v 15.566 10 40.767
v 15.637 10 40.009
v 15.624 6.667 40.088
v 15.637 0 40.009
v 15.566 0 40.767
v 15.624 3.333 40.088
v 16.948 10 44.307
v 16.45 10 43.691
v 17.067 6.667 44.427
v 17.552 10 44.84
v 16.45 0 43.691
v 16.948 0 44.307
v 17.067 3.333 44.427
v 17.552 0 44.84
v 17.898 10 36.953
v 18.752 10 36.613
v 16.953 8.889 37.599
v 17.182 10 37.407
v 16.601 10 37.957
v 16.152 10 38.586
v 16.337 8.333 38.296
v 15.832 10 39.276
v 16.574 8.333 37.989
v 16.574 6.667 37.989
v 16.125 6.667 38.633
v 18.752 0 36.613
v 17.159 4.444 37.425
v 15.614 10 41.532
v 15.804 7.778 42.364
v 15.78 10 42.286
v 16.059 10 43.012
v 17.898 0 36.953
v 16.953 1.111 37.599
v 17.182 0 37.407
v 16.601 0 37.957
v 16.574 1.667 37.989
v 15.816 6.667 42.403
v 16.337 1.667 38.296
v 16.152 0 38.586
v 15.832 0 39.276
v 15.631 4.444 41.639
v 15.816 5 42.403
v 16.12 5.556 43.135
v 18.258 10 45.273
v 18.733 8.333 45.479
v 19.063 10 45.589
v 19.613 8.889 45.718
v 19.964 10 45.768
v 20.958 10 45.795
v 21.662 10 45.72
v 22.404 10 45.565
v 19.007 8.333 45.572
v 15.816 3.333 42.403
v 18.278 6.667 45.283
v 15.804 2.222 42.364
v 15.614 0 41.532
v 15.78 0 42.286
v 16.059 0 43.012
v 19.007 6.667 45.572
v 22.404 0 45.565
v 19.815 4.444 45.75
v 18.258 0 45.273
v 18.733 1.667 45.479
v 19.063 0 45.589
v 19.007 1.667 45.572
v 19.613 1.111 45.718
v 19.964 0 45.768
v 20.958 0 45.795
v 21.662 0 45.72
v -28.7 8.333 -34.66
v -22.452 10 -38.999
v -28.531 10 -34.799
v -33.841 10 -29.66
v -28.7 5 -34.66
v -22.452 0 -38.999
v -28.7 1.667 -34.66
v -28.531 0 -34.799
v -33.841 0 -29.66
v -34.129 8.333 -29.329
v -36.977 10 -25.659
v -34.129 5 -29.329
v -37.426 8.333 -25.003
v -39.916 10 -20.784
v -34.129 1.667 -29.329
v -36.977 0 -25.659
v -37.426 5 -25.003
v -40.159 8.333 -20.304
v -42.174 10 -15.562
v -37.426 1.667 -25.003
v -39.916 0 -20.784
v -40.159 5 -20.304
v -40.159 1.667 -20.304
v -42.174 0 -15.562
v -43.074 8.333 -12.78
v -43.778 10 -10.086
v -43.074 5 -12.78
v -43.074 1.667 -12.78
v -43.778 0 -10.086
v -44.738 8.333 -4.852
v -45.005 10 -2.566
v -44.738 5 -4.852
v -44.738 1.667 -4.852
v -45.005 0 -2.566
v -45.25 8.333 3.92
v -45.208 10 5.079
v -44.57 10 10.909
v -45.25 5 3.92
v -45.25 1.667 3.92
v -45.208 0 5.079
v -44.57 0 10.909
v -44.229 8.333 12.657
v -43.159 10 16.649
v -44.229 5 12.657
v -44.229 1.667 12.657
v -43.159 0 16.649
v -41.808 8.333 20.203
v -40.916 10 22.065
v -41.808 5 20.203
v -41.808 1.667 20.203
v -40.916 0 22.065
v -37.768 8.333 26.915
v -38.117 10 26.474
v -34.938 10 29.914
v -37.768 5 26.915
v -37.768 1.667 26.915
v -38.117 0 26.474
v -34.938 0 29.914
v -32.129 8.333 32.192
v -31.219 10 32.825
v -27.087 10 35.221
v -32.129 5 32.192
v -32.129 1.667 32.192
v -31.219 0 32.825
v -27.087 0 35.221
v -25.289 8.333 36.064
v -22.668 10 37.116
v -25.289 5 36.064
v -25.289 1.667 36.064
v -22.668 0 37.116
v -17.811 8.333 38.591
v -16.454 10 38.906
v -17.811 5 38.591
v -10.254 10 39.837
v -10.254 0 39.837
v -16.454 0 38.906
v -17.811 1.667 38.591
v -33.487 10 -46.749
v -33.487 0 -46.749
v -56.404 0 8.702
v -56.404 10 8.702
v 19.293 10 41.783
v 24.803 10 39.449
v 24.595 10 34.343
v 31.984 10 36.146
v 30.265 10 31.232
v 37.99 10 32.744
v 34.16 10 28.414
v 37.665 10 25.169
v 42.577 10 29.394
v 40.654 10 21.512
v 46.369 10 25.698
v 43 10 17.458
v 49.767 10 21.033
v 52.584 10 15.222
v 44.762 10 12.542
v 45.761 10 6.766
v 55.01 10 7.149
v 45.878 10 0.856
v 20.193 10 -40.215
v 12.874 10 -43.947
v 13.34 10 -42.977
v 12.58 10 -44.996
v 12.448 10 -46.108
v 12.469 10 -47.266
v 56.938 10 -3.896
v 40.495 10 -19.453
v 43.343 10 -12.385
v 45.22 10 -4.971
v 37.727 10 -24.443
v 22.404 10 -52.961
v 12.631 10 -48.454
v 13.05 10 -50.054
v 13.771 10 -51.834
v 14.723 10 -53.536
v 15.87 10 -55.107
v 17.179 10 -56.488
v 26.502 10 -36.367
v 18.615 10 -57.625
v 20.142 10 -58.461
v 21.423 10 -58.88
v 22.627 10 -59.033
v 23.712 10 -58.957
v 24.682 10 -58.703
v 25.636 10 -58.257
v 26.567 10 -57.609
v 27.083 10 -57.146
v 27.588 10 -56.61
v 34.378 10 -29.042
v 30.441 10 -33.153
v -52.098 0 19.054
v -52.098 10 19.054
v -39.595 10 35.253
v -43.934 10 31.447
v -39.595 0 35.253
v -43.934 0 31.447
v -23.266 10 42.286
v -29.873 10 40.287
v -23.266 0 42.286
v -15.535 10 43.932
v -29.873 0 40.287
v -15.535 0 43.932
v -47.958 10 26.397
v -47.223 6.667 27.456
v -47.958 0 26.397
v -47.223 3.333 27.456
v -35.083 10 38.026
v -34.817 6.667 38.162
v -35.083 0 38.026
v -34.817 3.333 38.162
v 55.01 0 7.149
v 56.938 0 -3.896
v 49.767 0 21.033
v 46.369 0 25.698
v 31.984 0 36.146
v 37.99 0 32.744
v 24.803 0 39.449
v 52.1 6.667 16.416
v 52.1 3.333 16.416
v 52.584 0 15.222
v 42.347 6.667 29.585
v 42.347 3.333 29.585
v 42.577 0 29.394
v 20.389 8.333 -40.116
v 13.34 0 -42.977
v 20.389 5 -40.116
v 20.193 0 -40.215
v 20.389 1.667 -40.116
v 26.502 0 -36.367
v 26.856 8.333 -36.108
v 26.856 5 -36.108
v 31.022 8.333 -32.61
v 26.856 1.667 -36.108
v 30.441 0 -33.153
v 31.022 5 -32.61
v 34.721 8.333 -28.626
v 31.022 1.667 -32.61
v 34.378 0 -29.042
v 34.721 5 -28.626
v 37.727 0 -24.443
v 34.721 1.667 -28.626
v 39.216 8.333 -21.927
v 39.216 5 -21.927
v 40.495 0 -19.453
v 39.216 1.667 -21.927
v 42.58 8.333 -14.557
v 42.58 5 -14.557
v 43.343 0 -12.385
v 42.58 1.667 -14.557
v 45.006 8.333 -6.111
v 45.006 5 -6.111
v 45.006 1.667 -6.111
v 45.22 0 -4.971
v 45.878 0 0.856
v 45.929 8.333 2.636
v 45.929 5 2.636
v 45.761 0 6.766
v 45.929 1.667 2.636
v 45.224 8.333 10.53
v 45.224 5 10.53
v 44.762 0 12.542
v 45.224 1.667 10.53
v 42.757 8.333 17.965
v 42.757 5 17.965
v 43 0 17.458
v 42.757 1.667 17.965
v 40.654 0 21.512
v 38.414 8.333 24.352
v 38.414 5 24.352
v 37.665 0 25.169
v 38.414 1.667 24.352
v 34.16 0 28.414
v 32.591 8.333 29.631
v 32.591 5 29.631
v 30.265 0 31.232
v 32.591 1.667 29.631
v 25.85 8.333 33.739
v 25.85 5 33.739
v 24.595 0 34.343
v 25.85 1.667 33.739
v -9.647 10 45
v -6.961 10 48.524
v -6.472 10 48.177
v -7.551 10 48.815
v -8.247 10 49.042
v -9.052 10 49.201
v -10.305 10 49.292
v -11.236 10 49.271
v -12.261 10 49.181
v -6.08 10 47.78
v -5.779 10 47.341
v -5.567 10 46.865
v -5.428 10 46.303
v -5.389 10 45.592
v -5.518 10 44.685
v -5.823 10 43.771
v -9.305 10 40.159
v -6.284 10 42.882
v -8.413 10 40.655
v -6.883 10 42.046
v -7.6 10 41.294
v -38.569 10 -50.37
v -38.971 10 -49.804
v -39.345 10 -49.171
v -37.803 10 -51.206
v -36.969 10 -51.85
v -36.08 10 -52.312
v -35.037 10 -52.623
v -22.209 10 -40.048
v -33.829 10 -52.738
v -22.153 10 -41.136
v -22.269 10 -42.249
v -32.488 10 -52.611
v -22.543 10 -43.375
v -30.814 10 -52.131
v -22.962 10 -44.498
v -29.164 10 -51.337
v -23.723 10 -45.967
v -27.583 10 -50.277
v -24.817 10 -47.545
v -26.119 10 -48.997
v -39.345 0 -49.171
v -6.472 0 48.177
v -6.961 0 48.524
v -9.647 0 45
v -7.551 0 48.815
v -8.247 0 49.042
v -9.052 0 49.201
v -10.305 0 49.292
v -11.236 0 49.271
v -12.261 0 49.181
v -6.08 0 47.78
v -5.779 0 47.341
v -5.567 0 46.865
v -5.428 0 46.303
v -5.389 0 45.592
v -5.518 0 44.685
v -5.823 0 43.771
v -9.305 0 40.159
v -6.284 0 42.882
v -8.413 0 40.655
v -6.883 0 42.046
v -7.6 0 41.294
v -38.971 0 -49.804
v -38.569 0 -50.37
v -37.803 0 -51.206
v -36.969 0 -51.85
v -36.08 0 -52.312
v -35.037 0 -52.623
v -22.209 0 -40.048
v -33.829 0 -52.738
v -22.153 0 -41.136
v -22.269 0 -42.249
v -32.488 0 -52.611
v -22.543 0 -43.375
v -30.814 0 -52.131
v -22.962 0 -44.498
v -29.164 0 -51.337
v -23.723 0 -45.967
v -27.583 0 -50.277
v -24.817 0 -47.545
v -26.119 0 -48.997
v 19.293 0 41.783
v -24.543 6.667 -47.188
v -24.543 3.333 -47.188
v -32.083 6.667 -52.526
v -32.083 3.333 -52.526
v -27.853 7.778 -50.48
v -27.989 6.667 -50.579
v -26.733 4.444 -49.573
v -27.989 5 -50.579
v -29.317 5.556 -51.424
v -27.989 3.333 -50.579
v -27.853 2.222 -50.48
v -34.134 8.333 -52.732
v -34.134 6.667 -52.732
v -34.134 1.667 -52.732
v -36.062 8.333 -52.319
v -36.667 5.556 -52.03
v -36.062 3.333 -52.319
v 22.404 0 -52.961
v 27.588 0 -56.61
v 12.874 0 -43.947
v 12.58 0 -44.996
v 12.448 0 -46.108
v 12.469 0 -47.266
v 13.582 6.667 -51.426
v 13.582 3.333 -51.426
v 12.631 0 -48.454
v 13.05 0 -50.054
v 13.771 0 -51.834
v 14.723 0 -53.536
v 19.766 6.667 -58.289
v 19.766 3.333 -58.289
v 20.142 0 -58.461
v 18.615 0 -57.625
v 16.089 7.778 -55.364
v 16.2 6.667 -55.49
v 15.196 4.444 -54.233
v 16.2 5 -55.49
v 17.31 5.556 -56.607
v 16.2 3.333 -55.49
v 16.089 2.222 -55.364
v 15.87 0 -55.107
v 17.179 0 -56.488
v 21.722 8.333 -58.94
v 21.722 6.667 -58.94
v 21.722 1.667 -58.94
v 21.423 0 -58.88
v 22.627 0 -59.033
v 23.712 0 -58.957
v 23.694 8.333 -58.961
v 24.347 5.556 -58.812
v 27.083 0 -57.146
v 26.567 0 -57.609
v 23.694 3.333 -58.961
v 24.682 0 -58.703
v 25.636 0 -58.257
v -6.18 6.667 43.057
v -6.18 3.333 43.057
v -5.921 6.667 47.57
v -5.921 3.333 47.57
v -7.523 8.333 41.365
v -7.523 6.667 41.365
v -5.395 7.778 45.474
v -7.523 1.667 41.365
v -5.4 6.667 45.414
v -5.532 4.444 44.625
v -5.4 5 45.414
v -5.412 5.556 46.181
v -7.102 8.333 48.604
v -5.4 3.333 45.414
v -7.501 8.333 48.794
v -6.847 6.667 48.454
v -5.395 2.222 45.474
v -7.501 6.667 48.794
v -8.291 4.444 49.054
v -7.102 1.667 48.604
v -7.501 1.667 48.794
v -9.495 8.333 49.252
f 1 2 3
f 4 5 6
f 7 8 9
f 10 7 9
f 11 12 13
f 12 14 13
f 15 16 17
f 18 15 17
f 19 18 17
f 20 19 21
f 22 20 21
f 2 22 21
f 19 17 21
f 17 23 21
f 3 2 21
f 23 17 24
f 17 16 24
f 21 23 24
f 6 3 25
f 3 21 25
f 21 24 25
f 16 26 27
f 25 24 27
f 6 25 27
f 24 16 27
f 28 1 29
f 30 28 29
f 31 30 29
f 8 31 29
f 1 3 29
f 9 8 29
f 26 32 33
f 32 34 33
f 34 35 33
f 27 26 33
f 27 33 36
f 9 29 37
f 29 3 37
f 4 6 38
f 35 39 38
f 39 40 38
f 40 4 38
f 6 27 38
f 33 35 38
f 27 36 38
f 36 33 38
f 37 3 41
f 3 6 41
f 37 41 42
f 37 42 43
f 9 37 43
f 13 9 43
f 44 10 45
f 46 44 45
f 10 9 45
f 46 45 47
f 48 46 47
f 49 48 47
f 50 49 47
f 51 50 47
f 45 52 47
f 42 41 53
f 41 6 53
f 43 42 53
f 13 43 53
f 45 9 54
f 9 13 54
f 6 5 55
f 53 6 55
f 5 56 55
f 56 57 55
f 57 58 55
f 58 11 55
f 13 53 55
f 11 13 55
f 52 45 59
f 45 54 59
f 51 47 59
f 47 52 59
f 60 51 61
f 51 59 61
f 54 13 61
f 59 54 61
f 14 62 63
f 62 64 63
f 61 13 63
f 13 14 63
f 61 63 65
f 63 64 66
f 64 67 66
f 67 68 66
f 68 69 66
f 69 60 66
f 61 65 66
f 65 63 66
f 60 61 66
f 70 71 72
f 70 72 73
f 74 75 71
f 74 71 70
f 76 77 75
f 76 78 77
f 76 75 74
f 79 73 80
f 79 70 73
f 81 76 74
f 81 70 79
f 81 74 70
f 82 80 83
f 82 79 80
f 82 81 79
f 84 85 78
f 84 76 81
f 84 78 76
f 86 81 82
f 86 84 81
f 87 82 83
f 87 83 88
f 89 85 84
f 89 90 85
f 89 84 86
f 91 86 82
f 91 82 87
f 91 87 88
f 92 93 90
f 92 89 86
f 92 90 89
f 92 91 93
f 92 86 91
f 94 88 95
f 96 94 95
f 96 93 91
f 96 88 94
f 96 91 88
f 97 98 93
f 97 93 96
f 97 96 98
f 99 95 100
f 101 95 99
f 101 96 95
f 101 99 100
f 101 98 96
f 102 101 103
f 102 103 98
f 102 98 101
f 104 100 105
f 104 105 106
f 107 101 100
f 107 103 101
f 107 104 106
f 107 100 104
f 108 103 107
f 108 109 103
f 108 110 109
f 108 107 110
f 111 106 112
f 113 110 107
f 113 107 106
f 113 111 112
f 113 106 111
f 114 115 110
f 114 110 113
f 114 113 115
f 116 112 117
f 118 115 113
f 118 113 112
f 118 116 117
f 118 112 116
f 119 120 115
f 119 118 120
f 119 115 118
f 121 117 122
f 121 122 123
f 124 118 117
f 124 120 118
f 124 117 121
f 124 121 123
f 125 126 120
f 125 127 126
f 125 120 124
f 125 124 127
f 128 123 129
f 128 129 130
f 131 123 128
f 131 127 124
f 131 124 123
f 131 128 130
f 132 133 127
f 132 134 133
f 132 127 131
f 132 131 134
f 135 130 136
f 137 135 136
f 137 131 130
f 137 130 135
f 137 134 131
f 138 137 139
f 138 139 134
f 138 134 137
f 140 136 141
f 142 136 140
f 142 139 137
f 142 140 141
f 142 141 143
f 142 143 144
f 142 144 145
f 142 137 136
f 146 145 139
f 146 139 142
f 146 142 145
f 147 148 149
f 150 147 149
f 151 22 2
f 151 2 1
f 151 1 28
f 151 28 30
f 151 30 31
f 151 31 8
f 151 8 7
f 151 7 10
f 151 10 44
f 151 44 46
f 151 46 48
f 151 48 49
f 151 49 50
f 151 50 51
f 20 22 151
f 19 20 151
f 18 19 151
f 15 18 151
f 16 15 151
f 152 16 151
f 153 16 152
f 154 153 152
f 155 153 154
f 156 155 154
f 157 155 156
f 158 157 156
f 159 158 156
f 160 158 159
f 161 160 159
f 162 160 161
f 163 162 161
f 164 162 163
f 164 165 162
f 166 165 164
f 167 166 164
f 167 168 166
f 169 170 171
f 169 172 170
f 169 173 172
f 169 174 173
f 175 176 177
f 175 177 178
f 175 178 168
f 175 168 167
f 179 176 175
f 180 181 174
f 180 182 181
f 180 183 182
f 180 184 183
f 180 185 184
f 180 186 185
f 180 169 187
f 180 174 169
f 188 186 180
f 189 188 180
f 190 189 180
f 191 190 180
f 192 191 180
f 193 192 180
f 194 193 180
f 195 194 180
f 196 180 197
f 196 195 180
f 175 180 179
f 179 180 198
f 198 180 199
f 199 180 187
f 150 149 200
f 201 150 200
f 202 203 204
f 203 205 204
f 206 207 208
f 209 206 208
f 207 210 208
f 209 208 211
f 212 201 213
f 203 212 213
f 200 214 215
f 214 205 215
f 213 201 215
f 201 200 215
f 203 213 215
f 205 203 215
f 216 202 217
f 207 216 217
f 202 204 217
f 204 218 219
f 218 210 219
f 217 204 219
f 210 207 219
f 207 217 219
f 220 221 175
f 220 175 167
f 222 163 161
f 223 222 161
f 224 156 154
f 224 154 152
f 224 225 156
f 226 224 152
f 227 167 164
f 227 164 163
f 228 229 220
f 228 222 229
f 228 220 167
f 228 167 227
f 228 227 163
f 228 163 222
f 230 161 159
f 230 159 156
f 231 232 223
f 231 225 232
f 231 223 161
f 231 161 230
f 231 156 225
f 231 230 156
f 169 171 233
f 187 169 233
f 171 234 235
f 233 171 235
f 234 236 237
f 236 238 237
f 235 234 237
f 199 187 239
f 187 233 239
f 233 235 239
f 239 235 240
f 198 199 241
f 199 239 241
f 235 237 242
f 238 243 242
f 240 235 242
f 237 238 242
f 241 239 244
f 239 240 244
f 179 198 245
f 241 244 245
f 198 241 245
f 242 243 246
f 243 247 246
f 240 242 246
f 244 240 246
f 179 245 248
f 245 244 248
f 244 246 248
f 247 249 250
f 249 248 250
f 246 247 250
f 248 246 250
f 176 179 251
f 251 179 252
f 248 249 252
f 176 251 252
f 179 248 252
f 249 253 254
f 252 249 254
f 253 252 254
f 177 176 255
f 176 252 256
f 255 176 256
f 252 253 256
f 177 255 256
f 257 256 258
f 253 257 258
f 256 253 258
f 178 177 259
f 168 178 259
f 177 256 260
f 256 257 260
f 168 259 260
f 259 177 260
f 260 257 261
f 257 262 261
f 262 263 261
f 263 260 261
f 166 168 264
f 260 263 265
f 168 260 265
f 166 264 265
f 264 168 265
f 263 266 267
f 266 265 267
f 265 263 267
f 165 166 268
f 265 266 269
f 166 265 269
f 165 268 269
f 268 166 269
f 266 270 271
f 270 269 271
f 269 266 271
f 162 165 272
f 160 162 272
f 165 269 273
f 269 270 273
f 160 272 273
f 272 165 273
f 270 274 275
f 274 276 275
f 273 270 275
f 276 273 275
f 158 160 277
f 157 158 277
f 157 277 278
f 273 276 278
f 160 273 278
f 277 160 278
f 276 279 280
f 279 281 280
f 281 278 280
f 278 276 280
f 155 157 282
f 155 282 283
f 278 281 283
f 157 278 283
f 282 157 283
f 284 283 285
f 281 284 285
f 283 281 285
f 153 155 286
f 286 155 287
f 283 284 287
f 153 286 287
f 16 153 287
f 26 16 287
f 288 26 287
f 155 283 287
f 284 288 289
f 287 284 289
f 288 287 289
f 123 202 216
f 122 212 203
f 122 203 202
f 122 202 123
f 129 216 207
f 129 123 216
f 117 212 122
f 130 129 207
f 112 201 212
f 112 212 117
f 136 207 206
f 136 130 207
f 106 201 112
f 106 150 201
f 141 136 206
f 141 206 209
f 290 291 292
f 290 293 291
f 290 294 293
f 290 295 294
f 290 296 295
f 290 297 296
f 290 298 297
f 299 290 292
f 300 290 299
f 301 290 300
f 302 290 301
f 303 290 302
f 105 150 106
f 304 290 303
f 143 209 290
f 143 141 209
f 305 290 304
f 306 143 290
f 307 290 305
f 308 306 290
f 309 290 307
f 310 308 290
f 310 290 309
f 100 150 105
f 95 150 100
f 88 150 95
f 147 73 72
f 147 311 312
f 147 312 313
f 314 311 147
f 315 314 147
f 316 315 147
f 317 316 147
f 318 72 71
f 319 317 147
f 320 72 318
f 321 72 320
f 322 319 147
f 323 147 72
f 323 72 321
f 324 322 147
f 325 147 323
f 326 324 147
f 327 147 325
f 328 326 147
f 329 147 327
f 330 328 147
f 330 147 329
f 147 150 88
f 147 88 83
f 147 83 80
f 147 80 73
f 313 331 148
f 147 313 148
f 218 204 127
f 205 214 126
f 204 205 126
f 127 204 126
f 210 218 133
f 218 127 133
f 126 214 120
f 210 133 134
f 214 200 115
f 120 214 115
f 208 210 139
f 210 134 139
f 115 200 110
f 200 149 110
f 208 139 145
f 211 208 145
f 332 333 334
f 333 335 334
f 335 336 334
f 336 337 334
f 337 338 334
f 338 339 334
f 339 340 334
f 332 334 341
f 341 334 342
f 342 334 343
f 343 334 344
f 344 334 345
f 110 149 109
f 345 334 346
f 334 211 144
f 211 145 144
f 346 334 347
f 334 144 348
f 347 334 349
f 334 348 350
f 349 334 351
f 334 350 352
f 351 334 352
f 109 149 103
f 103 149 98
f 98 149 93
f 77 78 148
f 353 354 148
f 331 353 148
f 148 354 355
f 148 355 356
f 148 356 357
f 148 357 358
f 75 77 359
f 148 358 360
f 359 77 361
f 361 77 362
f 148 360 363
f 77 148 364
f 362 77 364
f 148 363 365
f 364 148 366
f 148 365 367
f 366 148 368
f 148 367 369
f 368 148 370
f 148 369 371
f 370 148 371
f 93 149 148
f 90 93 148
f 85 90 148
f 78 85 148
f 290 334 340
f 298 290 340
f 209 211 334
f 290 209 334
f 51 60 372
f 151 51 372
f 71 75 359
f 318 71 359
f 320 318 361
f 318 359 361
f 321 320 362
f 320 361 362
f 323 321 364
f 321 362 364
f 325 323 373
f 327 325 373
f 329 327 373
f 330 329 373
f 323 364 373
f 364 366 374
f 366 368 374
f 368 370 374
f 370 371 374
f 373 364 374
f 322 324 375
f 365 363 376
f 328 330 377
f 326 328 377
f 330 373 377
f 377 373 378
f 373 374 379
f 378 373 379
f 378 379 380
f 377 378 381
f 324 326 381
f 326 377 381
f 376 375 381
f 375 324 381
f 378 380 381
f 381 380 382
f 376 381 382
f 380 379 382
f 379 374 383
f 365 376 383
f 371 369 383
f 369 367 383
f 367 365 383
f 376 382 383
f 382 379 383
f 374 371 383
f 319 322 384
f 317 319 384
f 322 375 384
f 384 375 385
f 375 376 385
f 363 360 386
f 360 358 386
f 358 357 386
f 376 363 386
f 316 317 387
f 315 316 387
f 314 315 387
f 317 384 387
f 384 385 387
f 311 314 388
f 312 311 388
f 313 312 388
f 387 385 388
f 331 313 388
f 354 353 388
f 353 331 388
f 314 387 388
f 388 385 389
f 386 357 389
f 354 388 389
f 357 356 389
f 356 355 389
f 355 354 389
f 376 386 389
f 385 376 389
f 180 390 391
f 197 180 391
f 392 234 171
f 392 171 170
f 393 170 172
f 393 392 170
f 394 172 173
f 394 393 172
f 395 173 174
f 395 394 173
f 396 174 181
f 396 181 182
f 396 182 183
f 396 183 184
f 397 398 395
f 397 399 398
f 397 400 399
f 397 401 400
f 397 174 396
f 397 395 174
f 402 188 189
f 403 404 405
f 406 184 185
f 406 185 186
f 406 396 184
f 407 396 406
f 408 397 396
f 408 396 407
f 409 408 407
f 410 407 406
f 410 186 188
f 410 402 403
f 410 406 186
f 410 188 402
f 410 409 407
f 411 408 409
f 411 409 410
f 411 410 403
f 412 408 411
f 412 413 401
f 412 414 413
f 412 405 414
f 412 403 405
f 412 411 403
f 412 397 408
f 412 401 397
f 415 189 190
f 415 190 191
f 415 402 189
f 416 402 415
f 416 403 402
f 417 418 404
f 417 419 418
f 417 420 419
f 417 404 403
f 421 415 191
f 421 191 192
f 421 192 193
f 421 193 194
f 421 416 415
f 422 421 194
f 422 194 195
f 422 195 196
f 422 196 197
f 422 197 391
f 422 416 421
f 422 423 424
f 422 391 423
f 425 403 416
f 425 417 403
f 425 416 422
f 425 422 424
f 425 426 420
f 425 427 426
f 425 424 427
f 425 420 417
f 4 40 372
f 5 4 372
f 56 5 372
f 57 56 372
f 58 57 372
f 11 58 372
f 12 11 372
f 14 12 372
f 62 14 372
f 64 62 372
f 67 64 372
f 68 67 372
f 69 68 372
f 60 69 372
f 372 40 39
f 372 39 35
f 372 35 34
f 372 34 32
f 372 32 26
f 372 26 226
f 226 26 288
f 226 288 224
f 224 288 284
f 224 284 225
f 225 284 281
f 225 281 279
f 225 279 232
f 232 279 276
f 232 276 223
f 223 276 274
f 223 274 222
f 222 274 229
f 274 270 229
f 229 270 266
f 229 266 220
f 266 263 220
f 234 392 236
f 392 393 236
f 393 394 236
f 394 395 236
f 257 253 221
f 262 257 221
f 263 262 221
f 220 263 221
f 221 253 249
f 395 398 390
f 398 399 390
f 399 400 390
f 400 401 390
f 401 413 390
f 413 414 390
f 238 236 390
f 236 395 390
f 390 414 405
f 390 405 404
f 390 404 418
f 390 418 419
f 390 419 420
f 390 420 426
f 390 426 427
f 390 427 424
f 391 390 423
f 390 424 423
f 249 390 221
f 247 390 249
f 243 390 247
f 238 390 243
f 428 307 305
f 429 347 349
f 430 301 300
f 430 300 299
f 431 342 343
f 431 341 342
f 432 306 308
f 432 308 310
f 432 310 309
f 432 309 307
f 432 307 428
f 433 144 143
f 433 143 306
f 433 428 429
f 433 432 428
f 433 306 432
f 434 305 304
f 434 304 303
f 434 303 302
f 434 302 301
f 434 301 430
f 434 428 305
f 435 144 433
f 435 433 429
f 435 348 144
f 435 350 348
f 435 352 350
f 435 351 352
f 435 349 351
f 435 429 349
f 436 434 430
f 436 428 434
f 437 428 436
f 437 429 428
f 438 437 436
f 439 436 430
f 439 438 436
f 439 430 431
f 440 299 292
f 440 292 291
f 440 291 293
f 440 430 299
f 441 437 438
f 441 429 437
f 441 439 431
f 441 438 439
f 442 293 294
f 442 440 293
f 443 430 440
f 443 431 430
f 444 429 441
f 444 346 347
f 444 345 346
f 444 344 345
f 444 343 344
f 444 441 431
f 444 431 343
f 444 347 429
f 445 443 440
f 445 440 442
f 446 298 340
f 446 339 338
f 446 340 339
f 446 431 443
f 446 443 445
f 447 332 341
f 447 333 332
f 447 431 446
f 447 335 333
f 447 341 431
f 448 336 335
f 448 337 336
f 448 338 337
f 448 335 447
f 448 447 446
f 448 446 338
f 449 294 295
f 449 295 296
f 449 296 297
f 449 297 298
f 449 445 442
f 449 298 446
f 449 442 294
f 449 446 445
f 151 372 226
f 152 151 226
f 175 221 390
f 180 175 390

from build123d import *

# Parameters (mm, degrees)
BOSS_EXTRUDE1_DEPTH   = 10
BOSS_EXTRUDE1_2_DEPTH = 10


with BuildPart() as part:
    # Sketch1 → Boss-Extrude1 (new body)
    with BuildSketch(Plane(origin=(0, 0, 0), x_dir=(1, 0, 0), z_dir=(0, 1, 0))):
        with BuildLine():
            Line((-33.486602419, 46.749285127), (-56.403682484, -8.701661135))
            add(Edge.make_bspline(
                [(-56.403682484, -8.701661135), (-47.619362092, -32.517163226), (-39.471979778, -39.592078969), (-15.535090126, -43.932368814)],
                knots=[0, 0, 0, 0, 1, 1, 1, 1], degree=3))
            Line((-15.535090126, -43.932368814), (-9.647057112, -45))
            Line((-9.647057112, -45), (-12.261451972, -49.18120574))
            add(Edge.make_bspline(
                [(-10.254452676, -39.83663767), (-5.199461627, -41.013476487), (-1.694300478, -50.418800059), (-12.261451972, -49.18120574)],
                knots=[0, 0, 0, 0, 1, 1, 1, 1], degree=3))
            add(Edge.make_bspline(
                [(-22.451536716, 38.999083311), (-26.86197021, 36.469439855), (-33.627219214, 30.834724001), (-41.582367215, 19.043107829), (-45.581483474, 4.470319547), (-45.430056142, -12.166693994), (-36.949699035, -32.846128329), (-20.131629562, -39.004157196), (-10.254452676, -39.83663767)],
                knots=[0, 0, 0, 0, 0.143153018, 0.245274506, 0.396893762, 0.561689325, 0.708961154, 1, 1, 1, 1], degree=3))
            add(Edge.make_bspline(
                [(-22.451536716, 38.999083311), (-19.908993881, 46.665508044), (-34.13051951, 58.821468348), (-39.345472777, 49.170672138)],
                knots=[0, 0, 0, 0, 1, 1, 1, 1], degree=3))
            Line((-39.345472777, 49.170672138), (-33.486602419, 46.749285127))
        make_face()
    extrude(amount=BOSS_EXTRUDE1_DEPTH)


with BuildPart() as body_2:
    # Sketch1 → Boss-Extrude1 2 (new body)
    with BuildSketch(Plane(origin=(0, 0, 0), x_dir=(1, 0, 0), z_dir=(0, 1, 0))):
        with BuildLine():
            Line((19.292764236, -41.78342924), (24.802663686, -39.448953457))
            add(Edge.make_bspline(
                [(56.937828511, 3.895893832), (53.59733097, -21.267243905), (47.202309681, -29.95850239), (24.802663686, -39.448953457)],
                knots=[0, 0, 0, 0, 1, 1, 1, 1], degree=3))
            Line((56.937828511, 3.895893832), (22.404075684, 52.961359444))
            Line((22.404075684, 52.961359444), (27.58826498, 56.610148048))
            add(Edge.make_bspline(
                [(13.340127184, 42.977214972), (9.176234824, 49.898240378), (20.381453857, 64.88030394), (27.58826498, 56.610148048)],
                knots=[0, 0, 0, 0, 1, 1, 1, 1], degree=3))
            add(Edge.make_bspline(
                [(13.340127184, 42.977214972), (18.198382679, 41.47775735), (26.035797936, 37.466082022), (36.386010934, 27.709049555), (43.487435054, 14.370051668), (46.992877656, -1.89417355), (43.260303643, -23.931037037), (28.204878822, -33.63170525), (18.751558917, -36.612710071)],
                knots=[0, 0, 0, 0, 0.143153018, 0.245274506, 0.396893762, 0.561689325, 0.708961154, 1, 1, 1, 1], degree=3))
            add(Edge.make_bspline(
                [(18.751558917, -36.612710071), (13.113327903, -38.302450089), (15.345170537, -47.380531105), (22.404075684, -45.565384067)],
                knots=[0, 0, 0, 0, 1, 1, 1, 1], degree=3))
            Line((22.404075684, -45.565384067), (19.292764236, -41.78342924))
        make_face()
    extrude(amount=BOSS_EXTRUDE1_2_DEPTH)


solid = Compound([part.part, body_2.part])
